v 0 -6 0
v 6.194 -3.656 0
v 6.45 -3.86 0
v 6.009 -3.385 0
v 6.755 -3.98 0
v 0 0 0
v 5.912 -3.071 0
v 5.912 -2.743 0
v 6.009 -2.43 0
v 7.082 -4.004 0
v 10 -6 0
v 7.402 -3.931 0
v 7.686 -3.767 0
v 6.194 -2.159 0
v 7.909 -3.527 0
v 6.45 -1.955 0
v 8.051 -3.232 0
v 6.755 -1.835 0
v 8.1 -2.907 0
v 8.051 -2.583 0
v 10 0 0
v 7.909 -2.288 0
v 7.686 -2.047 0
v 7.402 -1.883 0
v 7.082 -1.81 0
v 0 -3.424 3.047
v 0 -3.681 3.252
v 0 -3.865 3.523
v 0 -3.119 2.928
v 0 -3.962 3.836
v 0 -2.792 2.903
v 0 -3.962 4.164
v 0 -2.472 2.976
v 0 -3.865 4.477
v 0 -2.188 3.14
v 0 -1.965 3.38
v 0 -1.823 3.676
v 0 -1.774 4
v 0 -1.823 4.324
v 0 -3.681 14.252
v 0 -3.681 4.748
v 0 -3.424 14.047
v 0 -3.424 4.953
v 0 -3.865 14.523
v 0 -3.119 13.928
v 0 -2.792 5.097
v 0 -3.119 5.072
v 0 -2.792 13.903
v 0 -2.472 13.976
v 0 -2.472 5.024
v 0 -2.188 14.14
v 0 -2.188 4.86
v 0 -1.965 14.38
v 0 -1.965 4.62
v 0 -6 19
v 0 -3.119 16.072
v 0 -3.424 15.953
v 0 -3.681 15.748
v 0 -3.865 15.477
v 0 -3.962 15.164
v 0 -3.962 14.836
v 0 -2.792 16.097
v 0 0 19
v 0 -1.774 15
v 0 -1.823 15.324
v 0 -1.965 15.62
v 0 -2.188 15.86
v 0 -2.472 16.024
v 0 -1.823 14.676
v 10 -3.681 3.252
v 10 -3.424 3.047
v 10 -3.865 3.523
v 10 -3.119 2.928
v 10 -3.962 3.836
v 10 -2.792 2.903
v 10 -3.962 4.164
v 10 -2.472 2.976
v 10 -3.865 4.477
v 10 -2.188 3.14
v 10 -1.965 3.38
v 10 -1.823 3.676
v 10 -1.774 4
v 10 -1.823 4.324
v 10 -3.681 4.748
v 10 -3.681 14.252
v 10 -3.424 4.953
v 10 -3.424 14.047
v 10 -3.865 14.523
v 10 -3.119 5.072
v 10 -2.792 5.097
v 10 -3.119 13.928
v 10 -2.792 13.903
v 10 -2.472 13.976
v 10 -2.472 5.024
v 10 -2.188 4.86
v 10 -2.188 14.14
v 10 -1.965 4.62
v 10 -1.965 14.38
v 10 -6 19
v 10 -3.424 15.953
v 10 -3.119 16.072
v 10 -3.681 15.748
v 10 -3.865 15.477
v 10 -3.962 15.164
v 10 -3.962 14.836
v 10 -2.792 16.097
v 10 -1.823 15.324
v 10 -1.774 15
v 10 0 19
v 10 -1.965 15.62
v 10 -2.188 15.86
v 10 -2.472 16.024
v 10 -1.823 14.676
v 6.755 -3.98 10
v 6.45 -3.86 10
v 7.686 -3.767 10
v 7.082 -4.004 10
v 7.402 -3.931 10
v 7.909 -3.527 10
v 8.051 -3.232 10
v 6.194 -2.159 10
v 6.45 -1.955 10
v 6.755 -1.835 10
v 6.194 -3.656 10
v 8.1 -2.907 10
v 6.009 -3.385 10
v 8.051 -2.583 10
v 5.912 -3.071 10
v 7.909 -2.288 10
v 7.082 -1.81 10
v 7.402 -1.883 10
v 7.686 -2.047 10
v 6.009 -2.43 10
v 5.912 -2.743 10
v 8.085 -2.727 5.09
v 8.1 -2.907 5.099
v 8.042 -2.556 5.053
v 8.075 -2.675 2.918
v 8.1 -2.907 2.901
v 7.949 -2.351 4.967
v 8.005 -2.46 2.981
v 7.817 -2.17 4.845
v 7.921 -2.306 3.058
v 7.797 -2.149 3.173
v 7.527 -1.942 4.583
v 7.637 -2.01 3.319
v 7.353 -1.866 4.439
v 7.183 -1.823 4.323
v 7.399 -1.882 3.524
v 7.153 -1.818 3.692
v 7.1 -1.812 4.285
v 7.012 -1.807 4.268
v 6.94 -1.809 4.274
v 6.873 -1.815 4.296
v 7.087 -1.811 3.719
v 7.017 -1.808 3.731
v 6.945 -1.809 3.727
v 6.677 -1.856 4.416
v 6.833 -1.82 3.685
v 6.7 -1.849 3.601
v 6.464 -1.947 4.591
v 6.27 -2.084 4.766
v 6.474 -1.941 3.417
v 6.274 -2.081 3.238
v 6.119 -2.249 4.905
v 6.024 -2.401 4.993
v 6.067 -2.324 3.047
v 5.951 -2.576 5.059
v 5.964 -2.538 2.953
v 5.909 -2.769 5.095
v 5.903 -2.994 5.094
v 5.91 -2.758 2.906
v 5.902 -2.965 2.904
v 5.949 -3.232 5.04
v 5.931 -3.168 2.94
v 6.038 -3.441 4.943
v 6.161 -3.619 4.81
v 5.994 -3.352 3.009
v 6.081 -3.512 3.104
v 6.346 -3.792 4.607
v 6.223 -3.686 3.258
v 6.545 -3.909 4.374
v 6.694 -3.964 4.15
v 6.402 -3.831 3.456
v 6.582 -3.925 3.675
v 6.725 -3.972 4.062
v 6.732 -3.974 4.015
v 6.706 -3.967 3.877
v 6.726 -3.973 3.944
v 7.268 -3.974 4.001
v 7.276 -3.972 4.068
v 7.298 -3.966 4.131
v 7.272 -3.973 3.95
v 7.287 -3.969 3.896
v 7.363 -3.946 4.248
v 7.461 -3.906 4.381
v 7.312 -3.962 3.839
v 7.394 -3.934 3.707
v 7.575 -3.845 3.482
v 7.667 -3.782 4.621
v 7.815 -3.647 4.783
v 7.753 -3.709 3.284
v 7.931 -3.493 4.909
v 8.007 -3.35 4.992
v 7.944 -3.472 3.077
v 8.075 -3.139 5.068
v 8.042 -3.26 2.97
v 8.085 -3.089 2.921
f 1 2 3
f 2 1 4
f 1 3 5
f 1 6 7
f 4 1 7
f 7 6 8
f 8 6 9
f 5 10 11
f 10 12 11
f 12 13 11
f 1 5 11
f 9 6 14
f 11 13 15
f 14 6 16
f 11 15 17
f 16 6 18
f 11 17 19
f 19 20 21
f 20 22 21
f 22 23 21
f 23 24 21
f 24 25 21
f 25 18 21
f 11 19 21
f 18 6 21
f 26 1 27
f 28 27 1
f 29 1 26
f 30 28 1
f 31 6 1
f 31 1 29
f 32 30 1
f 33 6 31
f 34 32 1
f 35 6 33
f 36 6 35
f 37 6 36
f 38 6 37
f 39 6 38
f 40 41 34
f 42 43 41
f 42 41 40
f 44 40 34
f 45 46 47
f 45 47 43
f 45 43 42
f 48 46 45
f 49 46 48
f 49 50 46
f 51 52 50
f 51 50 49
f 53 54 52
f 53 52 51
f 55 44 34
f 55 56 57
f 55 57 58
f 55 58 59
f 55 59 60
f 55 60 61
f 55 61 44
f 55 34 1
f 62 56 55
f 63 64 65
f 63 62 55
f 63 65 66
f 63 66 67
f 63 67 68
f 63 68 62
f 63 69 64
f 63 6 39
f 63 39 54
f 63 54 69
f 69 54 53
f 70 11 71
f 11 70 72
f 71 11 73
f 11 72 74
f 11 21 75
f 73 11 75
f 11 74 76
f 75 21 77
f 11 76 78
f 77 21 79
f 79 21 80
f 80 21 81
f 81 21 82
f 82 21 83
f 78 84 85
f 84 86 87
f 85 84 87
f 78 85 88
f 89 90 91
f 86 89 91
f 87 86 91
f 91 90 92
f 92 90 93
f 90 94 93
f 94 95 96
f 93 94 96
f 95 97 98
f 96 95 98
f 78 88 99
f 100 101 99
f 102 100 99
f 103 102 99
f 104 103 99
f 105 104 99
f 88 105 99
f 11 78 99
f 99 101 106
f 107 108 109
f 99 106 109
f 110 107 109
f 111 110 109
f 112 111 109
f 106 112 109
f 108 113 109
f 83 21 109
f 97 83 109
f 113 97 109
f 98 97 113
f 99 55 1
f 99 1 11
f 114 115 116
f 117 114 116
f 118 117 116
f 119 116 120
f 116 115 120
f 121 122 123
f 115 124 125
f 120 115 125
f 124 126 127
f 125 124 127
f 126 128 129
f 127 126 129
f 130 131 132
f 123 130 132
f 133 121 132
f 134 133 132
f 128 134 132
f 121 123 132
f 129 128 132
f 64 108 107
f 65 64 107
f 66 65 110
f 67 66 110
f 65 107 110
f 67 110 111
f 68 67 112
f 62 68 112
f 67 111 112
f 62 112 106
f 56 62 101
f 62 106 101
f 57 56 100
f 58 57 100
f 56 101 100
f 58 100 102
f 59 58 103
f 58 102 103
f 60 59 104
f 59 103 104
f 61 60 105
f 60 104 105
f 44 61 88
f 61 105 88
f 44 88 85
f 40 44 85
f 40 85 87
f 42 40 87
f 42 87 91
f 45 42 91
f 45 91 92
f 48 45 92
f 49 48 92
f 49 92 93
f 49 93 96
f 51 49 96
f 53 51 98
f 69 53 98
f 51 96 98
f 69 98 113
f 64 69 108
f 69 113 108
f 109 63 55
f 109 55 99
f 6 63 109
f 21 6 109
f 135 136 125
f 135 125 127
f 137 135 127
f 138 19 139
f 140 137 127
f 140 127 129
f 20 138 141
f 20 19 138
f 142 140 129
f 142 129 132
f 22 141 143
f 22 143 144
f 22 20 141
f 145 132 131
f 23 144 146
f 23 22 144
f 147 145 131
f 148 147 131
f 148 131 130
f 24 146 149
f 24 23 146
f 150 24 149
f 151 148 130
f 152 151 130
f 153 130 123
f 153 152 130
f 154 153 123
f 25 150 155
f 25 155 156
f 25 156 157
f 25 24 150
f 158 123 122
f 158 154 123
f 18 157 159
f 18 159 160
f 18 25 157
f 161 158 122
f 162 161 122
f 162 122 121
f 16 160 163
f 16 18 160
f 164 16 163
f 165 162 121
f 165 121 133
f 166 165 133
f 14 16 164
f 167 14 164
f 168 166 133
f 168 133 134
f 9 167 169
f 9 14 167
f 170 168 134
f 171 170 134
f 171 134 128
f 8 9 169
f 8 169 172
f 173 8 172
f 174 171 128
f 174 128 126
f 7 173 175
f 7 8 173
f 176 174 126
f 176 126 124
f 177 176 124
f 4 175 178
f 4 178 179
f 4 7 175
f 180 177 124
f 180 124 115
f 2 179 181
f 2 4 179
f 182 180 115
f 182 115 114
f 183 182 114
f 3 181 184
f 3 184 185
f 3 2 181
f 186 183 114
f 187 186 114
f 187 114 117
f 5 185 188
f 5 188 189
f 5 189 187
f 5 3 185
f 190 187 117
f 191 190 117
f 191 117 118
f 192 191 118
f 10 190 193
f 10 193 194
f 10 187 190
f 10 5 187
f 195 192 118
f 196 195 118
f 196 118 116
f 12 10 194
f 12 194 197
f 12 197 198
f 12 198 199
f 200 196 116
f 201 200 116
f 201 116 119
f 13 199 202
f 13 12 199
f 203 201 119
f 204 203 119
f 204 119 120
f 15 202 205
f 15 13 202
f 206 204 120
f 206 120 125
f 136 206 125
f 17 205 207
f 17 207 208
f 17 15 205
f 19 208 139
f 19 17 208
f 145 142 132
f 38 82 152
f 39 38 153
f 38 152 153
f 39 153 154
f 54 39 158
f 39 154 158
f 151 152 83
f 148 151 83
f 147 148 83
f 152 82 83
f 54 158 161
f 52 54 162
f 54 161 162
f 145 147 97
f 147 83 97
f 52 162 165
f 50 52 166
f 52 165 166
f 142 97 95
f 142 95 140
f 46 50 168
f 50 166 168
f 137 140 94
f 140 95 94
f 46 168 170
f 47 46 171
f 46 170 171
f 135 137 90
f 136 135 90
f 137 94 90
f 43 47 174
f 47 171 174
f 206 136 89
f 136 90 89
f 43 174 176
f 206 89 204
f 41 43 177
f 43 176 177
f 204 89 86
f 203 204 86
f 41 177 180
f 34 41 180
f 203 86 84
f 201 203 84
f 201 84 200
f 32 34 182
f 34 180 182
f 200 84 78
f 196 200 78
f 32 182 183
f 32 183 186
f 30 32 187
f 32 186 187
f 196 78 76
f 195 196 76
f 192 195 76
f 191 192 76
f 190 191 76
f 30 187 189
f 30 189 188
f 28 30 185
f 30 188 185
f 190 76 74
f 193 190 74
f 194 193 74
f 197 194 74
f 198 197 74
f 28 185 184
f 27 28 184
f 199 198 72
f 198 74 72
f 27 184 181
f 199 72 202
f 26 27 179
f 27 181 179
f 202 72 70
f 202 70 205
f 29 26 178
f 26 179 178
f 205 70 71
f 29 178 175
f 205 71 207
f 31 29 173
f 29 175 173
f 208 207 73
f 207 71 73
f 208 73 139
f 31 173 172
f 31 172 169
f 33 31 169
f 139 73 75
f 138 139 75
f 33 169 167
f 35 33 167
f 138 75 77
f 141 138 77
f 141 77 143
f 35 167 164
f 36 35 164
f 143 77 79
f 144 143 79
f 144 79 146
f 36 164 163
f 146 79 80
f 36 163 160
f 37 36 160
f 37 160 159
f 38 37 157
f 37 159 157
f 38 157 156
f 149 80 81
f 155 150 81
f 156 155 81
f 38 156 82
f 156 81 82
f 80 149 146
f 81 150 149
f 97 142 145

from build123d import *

# Parameters (mm, degrees)
F0_W     = 10
F0_H     = 19
F1_DEPTH = 6
F2_R     = 1.1
F3_DEPTH = 10
F4_R     = 1.1
F5_DEPTH = 10


with BuildPart() as f1:
    # F0 (on Front) → F1 (new body)
    with BuildSketch(Plane.XZ):
        with Locations((5, 9.5)):
            Rectangle(F0_W, F0_H)
    extrude(amount=F1_DEPTH)

    # F2 (on face) → F3 (cut)
    with BuildSketch(Plane.YZ.offset(10)):
        with Locations((-2.874218, 4)):
            Circle(F2_R)
        with Locations((-2.874218, 15)):
            Circle(F2_R)
    extrude(amount=-F3_DEPTH, mode=Mode.SUBTRACT)

    # F4 (on Top) → F5 (cut)
    with BuildSketch(Plane.XY):
        with Locations((7, -2.907384)):
            Circle(F4_R)
    extrude(amount=F5_DEPTH, mode=Mode.SUBTRACT)


solid = f1.part
